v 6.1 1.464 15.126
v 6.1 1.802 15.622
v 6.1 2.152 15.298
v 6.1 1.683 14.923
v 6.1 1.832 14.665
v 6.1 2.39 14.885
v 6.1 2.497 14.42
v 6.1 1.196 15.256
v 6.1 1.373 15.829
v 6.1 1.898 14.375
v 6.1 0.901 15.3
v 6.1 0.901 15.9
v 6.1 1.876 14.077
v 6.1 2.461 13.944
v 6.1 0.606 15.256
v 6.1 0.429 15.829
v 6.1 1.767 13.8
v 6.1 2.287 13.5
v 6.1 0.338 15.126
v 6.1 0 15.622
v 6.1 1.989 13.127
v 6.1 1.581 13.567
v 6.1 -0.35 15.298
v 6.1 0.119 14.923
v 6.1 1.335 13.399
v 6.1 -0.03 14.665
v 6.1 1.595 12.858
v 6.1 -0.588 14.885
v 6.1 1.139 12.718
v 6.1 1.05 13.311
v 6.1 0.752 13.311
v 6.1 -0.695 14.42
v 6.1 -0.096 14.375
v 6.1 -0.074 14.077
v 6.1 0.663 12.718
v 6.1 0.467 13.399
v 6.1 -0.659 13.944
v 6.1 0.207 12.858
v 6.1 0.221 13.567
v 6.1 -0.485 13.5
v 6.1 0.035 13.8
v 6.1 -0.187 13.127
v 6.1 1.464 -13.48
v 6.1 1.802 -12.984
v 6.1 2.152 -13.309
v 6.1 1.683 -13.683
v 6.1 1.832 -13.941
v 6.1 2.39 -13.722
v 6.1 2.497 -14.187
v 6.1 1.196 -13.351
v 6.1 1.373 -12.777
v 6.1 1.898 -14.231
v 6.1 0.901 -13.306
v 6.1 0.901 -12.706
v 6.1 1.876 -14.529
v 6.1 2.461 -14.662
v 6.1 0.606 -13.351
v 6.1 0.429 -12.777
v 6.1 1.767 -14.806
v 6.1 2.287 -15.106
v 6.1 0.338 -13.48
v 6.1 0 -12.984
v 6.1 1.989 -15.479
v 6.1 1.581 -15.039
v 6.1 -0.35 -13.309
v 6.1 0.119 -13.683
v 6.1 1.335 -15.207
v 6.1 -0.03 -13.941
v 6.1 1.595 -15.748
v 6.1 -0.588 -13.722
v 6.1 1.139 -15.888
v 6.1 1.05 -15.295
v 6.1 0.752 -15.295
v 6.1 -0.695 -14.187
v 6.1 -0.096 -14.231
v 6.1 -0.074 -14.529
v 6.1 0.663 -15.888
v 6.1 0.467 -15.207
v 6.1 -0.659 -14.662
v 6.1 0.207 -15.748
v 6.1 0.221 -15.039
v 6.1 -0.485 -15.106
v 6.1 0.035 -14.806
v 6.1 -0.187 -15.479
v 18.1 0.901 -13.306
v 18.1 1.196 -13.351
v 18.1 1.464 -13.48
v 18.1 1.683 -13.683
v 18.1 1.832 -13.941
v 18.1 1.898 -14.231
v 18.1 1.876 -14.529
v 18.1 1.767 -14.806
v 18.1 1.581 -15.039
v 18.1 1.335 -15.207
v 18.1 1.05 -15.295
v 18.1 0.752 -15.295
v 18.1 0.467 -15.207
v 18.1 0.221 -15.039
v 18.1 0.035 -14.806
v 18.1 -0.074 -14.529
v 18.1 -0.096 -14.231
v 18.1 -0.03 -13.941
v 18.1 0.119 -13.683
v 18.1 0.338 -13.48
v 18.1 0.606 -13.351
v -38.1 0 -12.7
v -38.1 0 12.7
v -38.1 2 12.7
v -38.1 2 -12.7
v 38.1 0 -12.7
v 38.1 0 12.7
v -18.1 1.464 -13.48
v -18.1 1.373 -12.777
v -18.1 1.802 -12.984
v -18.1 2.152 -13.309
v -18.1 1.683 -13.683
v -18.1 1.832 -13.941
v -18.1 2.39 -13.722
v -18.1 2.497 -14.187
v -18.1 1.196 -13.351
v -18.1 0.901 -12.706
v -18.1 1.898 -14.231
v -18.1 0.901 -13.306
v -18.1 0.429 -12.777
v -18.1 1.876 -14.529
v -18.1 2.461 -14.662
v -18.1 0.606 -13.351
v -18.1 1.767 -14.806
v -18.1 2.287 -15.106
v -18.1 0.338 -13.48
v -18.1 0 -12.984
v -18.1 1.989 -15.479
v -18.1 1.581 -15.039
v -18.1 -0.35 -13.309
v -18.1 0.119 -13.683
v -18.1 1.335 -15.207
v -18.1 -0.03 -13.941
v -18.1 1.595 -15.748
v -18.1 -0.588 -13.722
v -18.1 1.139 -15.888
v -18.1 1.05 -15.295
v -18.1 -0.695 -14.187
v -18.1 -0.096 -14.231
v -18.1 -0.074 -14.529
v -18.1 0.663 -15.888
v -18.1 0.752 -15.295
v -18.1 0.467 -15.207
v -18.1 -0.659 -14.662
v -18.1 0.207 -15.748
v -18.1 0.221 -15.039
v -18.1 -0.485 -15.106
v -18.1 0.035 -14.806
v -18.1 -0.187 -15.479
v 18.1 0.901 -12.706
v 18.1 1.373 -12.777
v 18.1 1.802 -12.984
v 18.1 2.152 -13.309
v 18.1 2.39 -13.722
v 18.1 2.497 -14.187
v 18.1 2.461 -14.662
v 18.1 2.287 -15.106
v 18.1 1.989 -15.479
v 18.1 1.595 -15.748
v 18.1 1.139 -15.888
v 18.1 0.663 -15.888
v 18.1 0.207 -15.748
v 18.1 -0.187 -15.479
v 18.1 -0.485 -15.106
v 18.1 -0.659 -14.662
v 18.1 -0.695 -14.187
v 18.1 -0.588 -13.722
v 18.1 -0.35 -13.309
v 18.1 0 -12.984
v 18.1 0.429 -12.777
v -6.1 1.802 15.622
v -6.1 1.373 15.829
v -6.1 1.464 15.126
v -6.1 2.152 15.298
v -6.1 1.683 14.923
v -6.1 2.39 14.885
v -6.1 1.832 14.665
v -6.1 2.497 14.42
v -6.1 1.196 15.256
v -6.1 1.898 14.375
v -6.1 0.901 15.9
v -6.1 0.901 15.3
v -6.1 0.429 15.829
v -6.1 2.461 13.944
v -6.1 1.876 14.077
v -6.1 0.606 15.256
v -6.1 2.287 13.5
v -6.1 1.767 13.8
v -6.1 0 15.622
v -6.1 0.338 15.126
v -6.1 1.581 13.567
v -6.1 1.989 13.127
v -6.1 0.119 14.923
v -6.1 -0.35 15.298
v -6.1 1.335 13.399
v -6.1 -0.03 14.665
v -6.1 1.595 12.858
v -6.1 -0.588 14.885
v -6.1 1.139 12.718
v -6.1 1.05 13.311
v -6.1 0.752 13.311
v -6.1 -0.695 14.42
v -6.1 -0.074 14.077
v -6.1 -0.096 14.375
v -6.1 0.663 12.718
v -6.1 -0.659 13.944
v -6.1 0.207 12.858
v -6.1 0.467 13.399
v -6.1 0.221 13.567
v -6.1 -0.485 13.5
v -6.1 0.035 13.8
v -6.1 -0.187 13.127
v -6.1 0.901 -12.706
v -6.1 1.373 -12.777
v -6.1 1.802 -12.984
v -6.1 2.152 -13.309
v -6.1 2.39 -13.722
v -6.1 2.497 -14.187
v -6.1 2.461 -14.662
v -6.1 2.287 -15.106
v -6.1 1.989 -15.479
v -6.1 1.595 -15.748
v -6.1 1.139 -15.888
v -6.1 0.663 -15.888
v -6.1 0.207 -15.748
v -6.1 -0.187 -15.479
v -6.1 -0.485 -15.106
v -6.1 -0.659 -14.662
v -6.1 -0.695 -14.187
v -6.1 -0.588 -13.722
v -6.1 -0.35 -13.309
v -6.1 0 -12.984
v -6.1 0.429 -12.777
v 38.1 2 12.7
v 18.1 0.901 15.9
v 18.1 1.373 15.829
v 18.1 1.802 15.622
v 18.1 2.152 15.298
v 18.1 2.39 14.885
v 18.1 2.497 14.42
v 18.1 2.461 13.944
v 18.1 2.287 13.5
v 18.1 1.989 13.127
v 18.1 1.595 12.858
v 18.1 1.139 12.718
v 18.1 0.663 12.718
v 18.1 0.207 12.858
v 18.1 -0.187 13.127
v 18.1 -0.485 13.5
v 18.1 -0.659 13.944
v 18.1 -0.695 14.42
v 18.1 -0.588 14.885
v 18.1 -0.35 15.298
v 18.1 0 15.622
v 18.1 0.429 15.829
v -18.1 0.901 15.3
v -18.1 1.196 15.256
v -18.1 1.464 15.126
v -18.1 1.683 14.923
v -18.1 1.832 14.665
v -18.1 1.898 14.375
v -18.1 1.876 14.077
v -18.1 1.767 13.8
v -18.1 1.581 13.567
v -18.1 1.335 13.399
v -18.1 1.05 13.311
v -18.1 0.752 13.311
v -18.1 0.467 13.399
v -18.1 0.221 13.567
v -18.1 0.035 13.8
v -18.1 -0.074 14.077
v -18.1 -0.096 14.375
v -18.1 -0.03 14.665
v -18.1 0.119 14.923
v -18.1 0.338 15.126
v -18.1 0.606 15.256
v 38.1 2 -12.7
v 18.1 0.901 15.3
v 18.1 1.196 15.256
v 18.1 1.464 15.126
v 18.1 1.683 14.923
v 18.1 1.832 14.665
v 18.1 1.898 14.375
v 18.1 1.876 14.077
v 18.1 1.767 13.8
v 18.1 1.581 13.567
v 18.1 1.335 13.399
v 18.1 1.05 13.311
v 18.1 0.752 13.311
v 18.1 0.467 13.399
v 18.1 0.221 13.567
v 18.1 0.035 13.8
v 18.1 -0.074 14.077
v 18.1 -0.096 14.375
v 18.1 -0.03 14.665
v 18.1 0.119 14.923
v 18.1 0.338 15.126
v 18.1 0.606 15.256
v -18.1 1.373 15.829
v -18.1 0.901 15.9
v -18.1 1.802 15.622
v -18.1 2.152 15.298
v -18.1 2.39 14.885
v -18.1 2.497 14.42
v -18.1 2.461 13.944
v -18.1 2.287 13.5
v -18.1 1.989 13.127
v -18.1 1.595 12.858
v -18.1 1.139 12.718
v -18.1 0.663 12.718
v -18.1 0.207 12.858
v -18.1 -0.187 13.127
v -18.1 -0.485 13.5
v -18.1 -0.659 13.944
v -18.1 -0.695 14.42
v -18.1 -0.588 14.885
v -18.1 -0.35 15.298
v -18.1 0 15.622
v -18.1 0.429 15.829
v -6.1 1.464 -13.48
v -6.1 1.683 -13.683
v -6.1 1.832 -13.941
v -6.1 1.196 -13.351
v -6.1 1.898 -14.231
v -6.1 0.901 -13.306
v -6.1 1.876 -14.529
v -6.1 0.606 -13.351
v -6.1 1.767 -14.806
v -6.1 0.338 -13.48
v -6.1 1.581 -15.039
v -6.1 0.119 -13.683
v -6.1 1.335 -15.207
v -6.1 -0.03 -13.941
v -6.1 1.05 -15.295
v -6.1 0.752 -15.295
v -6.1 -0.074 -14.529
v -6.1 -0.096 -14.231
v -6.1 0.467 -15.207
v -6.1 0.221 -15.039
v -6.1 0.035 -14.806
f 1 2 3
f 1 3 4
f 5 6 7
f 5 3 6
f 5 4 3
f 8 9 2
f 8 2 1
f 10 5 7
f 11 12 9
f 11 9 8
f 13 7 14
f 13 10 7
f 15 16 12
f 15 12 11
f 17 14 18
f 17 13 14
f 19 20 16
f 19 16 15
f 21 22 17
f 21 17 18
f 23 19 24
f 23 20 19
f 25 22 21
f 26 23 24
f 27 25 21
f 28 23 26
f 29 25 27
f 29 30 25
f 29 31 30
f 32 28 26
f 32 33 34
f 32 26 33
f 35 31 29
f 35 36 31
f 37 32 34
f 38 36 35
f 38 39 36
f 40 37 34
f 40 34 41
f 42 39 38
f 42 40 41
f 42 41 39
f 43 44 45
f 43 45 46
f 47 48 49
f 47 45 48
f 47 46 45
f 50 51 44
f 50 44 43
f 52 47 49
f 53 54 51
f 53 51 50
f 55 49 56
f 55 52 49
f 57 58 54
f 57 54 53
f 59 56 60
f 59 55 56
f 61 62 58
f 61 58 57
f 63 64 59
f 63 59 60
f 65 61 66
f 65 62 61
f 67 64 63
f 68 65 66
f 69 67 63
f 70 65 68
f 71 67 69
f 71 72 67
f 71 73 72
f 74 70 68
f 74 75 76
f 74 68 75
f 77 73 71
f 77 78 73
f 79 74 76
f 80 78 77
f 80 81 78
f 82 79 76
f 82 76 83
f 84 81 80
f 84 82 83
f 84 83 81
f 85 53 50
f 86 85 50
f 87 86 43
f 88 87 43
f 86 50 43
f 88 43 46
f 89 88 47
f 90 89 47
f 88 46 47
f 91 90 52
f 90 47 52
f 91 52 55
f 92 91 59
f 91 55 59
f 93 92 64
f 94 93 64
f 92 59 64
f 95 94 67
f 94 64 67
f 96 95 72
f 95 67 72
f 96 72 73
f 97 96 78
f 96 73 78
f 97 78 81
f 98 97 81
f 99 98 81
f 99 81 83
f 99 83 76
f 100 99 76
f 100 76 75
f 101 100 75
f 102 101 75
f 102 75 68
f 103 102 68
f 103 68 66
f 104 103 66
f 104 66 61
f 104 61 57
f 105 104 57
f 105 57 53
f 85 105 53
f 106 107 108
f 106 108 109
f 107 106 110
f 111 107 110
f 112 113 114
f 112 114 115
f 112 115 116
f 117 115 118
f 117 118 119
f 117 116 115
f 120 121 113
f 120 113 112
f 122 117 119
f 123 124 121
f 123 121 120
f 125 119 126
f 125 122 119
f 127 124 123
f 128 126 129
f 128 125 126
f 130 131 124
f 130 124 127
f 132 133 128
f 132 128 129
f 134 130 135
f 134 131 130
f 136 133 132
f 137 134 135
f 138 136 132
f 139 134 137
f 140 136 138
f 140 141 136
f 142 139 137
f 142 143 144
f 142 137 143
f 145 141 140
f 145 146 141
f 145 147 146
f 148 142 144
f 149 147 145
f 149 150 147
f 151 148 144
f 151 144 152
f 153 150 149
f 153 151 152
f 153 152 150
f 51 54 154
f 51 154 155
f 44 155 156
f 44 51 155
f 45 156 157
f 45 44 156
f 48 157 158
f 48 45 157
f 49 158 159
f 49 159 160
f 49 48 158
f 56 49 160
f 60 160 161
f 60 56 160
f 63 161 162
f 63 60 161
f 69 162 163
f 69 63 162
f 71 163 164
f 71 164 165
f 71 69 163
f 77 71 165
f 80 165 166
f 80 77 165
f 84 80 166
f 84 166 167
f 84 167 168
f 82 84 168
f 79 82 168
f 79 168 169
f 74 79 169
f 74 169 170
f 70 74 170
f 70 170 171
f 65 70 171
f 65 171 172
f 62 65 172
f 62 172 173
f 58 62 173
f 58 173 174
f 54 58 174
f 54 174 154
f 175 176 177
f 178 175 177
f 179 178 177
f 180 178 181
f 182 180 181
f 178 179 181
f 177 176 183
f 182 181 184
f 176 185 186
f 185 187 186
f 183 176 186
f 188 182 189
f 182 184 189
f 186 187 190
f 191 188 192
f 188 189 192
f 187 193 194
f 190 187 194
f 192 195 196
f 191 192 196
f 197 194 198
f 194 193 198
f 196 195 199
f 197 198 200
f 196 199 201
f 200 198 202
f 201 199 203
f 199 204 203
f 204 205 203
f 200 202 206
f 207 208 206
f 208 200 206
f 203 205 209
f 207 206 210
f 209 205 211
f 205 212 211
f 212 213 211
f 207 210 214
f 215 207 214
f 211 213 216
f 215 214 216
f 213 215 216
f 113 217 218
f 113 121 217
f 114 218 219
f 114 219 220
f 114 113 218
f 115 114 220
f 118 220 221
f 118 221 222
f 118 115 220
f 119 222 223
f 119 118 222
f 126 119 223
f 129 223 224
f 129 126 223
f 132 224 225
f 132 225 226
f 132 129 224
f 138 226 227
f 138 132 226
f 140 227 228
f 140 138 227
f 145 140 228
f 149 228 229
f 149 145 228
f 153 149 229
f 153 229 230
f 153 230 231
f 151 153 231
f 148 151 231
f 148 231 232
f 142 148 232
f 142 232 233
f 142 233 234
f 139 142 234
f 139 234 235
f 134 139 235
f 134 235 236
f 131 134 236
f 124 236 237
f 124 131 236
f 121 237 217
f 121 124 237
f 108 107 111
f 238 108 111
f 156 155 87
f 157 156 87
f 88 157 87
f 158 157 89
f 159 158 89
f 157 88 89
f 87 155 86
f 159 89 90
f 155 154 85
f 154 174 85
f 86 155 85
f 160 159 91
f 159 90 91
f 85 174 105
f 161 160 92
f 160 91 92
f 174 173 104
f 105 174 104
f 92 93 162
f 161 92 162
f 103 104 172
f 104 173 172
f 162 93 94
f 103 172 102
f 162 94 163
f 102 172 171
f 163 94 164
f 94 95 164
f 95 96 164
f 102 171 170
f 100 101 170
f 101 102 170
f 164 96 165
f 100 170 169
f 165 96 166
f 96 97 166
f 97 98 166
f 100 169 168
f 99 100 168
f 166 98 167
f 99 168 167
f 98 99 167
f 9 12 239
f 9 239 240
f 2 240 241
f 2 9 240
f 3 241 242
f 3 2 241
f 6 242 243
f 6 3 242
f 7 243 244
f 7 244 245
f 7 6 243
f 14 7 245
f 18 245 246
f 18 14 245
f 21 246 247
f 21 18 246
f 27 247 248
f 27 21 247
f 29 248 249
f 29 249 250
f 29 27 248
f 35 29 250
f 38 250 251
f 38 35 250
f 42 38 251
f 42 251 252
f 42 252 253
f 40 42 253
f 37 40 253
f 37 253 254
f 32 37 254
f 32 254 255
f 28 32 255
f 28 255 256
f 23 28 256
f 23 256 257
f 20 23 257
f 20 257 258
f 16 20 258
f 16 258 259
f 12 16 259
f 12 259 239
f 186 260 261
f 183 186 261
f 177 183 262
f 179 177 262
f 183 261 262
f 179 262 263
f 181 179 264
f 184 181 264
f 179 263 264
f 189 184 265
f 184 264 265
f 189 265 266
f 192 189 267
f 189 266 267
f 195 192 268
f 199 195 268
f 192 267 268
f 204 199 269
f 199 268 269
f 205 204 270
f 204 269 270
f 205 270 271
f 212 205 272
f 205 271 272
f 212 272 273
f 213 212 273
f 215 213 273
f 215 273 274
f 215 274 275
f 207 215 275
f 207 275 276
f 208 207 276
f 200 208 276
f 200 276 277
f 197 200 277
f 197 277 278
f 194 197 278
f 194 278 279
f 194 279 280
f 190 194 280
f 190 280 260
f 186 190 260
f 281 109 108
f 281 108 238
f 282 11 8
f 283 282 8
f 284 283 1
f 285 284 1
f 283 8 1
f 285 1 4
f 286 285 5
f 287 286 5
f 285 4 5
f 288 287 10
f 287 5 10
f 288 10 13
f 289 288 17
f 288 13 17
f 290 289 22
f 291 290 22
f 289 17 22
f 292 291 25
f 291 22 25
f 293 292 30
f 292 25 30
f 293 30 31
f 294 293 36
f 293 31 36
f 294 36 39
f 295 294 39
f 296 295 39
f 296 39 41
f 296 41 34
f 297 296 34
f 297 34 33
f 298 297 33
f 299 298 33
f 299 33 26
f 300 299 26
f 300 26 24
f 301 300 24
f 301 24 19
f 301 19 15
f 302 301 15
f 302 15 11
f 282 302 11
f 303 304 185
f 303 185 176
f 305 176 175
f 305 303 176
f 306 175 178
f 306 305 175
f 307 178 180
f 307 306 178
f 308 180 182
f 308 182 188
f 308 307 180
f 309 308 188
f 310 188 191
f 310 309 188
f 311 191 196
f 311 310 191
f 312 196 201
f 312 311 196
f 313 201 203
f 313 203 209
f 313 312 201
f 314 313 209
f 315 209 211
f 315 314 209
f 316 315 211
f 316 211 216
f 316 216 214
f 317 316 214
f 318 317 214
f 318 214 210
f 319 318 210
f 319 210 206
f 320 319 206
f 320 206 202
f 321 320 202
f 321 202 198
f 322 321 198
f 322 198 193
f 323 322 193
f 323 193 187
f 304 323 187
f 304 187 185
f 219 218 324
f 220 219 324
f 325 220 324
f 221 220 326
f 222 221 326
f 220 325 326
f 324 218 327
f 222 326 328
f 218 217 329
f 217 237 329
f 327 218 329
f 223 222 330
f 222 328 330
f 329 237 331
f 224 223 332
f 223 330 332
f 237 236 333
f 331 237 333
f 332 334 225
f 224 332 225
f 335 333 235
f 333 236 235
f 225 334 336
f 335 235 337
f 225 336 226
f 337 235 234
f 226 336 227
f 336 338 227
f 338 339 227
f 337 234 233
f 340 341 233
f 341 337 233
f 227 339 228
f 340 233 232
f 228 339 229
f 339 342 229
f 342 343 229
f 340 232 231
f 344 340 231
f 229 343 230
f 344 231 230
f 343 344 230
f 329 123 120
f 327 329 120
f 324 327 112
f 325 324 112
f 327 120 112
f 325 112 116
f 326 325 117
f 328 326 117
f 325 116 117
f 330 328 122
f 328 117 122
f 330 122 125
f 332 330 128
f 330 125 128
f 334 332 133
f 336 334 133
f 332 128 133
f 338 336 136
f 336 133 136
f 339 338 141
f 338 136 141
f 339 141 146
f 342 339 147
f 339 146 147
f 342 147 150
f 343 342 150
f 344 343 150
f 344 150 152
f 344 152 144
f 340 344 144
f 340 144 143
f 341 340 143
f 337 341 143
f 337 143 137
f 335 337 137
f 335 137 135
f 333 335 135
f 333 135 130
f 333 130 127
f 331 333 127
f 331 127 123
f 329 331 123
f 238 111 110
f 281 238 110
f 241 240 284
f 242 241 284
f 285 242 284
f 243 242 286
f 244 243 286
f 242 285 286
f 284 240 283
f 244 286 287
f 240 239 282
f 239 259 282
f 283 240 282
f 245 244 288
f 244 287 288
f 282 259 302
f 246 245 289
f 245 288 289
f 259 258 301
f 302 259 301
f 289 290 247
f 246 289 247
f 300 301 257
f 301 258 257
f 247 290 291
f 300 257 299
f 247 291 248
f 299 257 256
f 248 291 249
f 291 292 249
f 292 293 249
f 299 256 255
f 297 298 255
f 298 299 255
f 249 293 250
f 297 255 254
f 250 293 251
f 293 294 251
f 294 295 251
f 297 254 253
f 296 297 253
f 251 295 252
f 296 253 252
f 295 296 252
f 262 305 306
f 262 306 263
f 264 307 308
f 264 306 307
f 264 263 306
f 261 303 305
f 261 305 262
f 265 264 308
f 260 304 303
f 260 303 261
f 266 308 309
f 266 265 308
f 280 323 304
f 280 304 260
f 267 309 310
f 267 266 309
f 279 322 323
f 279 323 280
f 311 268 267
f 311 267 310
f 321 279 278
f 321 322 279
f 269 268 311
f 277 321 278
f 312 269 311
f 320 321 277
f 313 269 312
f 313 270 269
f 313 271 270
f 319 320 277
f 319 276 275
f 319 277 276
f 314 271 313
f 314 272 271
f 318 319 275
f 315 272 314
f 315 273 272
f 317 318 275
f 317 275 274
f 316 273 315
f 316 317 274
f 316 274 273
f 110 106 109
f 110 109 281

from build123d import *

# Parameters (mm, degrees)
CROQUIS1_W                 = 76.2
CROQUIS1_H                 = 25.4
SALIENTE_EXTRUIR1_DEPTH    = 2
CROQUIS2_R                 = 1.6
SALIENTE_EXTRUIR2_DEPTH    = 76.2
SALIENTE_EXTRUIR2_2_DEPTH  = 76.2
CROQUIS4_R                 = 1
CORTAR_EXTRUIR2_DEPTH      = 76.2
CORTAR_EXTRUIR6_DEPTH      = 42.375126825
CORTAR_EXTRUIR6_DEPTH_BACK = 42.375126825
CROQUIS5_W                 = 20
CROQUIS5_H                 = 3.21236059
CROQUIS5_H_2               = 3.2
CROQUIS5_W_2               = 12.2


with BuildPart() as part:
    # Croquis1 → Saliente-Extruir1 (new body)
    with BuildSketch(Plane(origin=(0, 0, 0), x_dir=(1, 0, 0), z_dir=(0, 1, 0))):
        Rectangle(CROQUIS1_W, CROQUIS1_H)
    extrude(amount=SALIENTE_EXTRUIR1_DEPTH)


with BuildPart() as body_2:
    # Croquis2 → Saliente-Extruir2 (new body)
    with BuildSketch(Plane.ZY.offset(38.1)):
        with Locations((-14.306180295, 0.901009784)):
            Circle(CROQUIS2_R)
    extrude(amount=-SALIENTE_EXTRUIR2_DEPTH)


with BuildPart() as body_3:
    # Croquis2 → Saliente-Extruir2 2 (new body)
    with BuildSketch(Plane.ZY.offset(38.1)):
        with Locations((14.3, 0.901009784)):
            Circle(CROQUIS2_R)
    extrude(amount=-SALIENTE_EXTRUIR2_2_DEPTH)


with BuildPart() as cortar_extruir2_tool:
    # Croquis4 → Cortar-Extruir2 (new body)
    with BuildSketch(Plane.ZY.offset(38.1)):
        with Locations((-14.306180295, 0.901009784)):
            Circle(CROQUIS4_R)
        with Locations((14.3, 0.901009784)):
            Circle(CROQUIS4_R)
    extrude(amount=-CORTAR_EXTRUIR2_DEPTH)


with BuildPart() as body_2_1:
    add(body_2.part)

    # Cortar-Extruir2: cut by cortar_extruir2_tool
    add(cortar_extruir2_tool.part, mode=Mode.SUBTRACT)


with BuildPart() as body_3_1:
    add(body_3.part)

    # Cortar-Extruir2: cut by cortar_extruir2_tool
    add(cortar_extruir2_tool.part, mode=Mode.SUBTRACT)


with BuildPart() as cortar_extruir6_tool:
    # Croquis5 → Cortar-Extruir6 (new, two sides: drawn at the far end of the back side and taken through both)
    with BuildSketch(Plane(origin=(0, 2, 0), x_dir=(1, 0, 0), z_dir=(0, 1, 0)).offset(-CORTAR_EXTRUIR6_DEPTH_BACK)):
        with Locations((-28.1, 14.306180295)):
            Rectangle(CROQUIS5_W, CROQUIS5_H)
        with Locations((28.1, 14.306180295)):
            Rectangle(CROQUIS5_W, CROQUIS5_H_2)
        with Locations((0, 14.306180295)):
            Rectangle(CROQUIS5_W_2, CROQUIS5_H_2)
        with Locations((-28.1, -14.3)):
            Rectangle(CROQUIS5_W, CROQUIS5_H_2)
        with Locations((0, -14.3)):
            Rectangle(CROQUIS5_W_2, CROQUIS5_H_2)
        with Locations((28.1, -14.3)):
            Rectangle(CROQUIS5_W, CROQUIS5_H_2)
    extrude(amount=CORTAR_EXTRUIR6_DEPTH + CORTAR_EXTRUIR6_DEPTH_BACK)


with BuildPart() as body_2_2:
    add(body_2_1.part)

    # Cortar-Extruir6: cut by cortar_extruir6_tool
    add(cortar_extruir6_tool.part, mode=Mode.SUBTRACT)


with BuildPart() as body_3_2:
    add(body_3_1.part)

    # Cortar-Extruir6: cut by cortar_extruir6_tool
    add(cortar_extruir6_tool.part, mode=Mode.SUBTRACT)


with BuildPart() as cortar_extruir6_piece_1:
    # of the separate pieces the step leaves, piece 1, a body of its own (cortar_extruir6_pieces)
    add(body_2_2.part.solids().sort_by_distance((6.1, 0.901009784, -12.706180295))[0])


with BuildPart() as cortar_extruir6_piece_2:
    # of the separate pieces the step leaves, piece 2, a body of its own (cortar_extruir6_pieces)
    add(body_2_2.part.solids().sort_by_distance((-6.1, 0.901009784, -12.706180295))[0])


with BuildPart() as cortar_extruir6_piece_1_of_body_3:
    # of the separate pieces the step leaves, piece 1, a body of its own (cortar_extruir6_pieces_of_body_3)
    add(body_3_2.part.solids().sort_by_distance((6.1, 0.901009784, 15.9))[0])


with BuildPart() as cortar_extruir6_piece_2_of_body_3:
    # of the separate pieces the step leaves, piece 2, a body of its own (cortar_extruir6_pieces_of_body_3)
    add(body_3_2.part.solids().sort_by_distance((-18.1, 0.901009784, 15.9))[0])


solid = Compound([part.part, cortar_extruir6_piece_1.part, cortar_extruir6_piece_2.part, cortar_extruir6_piece_1_of_body_3.part, cortar_extruir6_piece_2_of_body_3.part])
